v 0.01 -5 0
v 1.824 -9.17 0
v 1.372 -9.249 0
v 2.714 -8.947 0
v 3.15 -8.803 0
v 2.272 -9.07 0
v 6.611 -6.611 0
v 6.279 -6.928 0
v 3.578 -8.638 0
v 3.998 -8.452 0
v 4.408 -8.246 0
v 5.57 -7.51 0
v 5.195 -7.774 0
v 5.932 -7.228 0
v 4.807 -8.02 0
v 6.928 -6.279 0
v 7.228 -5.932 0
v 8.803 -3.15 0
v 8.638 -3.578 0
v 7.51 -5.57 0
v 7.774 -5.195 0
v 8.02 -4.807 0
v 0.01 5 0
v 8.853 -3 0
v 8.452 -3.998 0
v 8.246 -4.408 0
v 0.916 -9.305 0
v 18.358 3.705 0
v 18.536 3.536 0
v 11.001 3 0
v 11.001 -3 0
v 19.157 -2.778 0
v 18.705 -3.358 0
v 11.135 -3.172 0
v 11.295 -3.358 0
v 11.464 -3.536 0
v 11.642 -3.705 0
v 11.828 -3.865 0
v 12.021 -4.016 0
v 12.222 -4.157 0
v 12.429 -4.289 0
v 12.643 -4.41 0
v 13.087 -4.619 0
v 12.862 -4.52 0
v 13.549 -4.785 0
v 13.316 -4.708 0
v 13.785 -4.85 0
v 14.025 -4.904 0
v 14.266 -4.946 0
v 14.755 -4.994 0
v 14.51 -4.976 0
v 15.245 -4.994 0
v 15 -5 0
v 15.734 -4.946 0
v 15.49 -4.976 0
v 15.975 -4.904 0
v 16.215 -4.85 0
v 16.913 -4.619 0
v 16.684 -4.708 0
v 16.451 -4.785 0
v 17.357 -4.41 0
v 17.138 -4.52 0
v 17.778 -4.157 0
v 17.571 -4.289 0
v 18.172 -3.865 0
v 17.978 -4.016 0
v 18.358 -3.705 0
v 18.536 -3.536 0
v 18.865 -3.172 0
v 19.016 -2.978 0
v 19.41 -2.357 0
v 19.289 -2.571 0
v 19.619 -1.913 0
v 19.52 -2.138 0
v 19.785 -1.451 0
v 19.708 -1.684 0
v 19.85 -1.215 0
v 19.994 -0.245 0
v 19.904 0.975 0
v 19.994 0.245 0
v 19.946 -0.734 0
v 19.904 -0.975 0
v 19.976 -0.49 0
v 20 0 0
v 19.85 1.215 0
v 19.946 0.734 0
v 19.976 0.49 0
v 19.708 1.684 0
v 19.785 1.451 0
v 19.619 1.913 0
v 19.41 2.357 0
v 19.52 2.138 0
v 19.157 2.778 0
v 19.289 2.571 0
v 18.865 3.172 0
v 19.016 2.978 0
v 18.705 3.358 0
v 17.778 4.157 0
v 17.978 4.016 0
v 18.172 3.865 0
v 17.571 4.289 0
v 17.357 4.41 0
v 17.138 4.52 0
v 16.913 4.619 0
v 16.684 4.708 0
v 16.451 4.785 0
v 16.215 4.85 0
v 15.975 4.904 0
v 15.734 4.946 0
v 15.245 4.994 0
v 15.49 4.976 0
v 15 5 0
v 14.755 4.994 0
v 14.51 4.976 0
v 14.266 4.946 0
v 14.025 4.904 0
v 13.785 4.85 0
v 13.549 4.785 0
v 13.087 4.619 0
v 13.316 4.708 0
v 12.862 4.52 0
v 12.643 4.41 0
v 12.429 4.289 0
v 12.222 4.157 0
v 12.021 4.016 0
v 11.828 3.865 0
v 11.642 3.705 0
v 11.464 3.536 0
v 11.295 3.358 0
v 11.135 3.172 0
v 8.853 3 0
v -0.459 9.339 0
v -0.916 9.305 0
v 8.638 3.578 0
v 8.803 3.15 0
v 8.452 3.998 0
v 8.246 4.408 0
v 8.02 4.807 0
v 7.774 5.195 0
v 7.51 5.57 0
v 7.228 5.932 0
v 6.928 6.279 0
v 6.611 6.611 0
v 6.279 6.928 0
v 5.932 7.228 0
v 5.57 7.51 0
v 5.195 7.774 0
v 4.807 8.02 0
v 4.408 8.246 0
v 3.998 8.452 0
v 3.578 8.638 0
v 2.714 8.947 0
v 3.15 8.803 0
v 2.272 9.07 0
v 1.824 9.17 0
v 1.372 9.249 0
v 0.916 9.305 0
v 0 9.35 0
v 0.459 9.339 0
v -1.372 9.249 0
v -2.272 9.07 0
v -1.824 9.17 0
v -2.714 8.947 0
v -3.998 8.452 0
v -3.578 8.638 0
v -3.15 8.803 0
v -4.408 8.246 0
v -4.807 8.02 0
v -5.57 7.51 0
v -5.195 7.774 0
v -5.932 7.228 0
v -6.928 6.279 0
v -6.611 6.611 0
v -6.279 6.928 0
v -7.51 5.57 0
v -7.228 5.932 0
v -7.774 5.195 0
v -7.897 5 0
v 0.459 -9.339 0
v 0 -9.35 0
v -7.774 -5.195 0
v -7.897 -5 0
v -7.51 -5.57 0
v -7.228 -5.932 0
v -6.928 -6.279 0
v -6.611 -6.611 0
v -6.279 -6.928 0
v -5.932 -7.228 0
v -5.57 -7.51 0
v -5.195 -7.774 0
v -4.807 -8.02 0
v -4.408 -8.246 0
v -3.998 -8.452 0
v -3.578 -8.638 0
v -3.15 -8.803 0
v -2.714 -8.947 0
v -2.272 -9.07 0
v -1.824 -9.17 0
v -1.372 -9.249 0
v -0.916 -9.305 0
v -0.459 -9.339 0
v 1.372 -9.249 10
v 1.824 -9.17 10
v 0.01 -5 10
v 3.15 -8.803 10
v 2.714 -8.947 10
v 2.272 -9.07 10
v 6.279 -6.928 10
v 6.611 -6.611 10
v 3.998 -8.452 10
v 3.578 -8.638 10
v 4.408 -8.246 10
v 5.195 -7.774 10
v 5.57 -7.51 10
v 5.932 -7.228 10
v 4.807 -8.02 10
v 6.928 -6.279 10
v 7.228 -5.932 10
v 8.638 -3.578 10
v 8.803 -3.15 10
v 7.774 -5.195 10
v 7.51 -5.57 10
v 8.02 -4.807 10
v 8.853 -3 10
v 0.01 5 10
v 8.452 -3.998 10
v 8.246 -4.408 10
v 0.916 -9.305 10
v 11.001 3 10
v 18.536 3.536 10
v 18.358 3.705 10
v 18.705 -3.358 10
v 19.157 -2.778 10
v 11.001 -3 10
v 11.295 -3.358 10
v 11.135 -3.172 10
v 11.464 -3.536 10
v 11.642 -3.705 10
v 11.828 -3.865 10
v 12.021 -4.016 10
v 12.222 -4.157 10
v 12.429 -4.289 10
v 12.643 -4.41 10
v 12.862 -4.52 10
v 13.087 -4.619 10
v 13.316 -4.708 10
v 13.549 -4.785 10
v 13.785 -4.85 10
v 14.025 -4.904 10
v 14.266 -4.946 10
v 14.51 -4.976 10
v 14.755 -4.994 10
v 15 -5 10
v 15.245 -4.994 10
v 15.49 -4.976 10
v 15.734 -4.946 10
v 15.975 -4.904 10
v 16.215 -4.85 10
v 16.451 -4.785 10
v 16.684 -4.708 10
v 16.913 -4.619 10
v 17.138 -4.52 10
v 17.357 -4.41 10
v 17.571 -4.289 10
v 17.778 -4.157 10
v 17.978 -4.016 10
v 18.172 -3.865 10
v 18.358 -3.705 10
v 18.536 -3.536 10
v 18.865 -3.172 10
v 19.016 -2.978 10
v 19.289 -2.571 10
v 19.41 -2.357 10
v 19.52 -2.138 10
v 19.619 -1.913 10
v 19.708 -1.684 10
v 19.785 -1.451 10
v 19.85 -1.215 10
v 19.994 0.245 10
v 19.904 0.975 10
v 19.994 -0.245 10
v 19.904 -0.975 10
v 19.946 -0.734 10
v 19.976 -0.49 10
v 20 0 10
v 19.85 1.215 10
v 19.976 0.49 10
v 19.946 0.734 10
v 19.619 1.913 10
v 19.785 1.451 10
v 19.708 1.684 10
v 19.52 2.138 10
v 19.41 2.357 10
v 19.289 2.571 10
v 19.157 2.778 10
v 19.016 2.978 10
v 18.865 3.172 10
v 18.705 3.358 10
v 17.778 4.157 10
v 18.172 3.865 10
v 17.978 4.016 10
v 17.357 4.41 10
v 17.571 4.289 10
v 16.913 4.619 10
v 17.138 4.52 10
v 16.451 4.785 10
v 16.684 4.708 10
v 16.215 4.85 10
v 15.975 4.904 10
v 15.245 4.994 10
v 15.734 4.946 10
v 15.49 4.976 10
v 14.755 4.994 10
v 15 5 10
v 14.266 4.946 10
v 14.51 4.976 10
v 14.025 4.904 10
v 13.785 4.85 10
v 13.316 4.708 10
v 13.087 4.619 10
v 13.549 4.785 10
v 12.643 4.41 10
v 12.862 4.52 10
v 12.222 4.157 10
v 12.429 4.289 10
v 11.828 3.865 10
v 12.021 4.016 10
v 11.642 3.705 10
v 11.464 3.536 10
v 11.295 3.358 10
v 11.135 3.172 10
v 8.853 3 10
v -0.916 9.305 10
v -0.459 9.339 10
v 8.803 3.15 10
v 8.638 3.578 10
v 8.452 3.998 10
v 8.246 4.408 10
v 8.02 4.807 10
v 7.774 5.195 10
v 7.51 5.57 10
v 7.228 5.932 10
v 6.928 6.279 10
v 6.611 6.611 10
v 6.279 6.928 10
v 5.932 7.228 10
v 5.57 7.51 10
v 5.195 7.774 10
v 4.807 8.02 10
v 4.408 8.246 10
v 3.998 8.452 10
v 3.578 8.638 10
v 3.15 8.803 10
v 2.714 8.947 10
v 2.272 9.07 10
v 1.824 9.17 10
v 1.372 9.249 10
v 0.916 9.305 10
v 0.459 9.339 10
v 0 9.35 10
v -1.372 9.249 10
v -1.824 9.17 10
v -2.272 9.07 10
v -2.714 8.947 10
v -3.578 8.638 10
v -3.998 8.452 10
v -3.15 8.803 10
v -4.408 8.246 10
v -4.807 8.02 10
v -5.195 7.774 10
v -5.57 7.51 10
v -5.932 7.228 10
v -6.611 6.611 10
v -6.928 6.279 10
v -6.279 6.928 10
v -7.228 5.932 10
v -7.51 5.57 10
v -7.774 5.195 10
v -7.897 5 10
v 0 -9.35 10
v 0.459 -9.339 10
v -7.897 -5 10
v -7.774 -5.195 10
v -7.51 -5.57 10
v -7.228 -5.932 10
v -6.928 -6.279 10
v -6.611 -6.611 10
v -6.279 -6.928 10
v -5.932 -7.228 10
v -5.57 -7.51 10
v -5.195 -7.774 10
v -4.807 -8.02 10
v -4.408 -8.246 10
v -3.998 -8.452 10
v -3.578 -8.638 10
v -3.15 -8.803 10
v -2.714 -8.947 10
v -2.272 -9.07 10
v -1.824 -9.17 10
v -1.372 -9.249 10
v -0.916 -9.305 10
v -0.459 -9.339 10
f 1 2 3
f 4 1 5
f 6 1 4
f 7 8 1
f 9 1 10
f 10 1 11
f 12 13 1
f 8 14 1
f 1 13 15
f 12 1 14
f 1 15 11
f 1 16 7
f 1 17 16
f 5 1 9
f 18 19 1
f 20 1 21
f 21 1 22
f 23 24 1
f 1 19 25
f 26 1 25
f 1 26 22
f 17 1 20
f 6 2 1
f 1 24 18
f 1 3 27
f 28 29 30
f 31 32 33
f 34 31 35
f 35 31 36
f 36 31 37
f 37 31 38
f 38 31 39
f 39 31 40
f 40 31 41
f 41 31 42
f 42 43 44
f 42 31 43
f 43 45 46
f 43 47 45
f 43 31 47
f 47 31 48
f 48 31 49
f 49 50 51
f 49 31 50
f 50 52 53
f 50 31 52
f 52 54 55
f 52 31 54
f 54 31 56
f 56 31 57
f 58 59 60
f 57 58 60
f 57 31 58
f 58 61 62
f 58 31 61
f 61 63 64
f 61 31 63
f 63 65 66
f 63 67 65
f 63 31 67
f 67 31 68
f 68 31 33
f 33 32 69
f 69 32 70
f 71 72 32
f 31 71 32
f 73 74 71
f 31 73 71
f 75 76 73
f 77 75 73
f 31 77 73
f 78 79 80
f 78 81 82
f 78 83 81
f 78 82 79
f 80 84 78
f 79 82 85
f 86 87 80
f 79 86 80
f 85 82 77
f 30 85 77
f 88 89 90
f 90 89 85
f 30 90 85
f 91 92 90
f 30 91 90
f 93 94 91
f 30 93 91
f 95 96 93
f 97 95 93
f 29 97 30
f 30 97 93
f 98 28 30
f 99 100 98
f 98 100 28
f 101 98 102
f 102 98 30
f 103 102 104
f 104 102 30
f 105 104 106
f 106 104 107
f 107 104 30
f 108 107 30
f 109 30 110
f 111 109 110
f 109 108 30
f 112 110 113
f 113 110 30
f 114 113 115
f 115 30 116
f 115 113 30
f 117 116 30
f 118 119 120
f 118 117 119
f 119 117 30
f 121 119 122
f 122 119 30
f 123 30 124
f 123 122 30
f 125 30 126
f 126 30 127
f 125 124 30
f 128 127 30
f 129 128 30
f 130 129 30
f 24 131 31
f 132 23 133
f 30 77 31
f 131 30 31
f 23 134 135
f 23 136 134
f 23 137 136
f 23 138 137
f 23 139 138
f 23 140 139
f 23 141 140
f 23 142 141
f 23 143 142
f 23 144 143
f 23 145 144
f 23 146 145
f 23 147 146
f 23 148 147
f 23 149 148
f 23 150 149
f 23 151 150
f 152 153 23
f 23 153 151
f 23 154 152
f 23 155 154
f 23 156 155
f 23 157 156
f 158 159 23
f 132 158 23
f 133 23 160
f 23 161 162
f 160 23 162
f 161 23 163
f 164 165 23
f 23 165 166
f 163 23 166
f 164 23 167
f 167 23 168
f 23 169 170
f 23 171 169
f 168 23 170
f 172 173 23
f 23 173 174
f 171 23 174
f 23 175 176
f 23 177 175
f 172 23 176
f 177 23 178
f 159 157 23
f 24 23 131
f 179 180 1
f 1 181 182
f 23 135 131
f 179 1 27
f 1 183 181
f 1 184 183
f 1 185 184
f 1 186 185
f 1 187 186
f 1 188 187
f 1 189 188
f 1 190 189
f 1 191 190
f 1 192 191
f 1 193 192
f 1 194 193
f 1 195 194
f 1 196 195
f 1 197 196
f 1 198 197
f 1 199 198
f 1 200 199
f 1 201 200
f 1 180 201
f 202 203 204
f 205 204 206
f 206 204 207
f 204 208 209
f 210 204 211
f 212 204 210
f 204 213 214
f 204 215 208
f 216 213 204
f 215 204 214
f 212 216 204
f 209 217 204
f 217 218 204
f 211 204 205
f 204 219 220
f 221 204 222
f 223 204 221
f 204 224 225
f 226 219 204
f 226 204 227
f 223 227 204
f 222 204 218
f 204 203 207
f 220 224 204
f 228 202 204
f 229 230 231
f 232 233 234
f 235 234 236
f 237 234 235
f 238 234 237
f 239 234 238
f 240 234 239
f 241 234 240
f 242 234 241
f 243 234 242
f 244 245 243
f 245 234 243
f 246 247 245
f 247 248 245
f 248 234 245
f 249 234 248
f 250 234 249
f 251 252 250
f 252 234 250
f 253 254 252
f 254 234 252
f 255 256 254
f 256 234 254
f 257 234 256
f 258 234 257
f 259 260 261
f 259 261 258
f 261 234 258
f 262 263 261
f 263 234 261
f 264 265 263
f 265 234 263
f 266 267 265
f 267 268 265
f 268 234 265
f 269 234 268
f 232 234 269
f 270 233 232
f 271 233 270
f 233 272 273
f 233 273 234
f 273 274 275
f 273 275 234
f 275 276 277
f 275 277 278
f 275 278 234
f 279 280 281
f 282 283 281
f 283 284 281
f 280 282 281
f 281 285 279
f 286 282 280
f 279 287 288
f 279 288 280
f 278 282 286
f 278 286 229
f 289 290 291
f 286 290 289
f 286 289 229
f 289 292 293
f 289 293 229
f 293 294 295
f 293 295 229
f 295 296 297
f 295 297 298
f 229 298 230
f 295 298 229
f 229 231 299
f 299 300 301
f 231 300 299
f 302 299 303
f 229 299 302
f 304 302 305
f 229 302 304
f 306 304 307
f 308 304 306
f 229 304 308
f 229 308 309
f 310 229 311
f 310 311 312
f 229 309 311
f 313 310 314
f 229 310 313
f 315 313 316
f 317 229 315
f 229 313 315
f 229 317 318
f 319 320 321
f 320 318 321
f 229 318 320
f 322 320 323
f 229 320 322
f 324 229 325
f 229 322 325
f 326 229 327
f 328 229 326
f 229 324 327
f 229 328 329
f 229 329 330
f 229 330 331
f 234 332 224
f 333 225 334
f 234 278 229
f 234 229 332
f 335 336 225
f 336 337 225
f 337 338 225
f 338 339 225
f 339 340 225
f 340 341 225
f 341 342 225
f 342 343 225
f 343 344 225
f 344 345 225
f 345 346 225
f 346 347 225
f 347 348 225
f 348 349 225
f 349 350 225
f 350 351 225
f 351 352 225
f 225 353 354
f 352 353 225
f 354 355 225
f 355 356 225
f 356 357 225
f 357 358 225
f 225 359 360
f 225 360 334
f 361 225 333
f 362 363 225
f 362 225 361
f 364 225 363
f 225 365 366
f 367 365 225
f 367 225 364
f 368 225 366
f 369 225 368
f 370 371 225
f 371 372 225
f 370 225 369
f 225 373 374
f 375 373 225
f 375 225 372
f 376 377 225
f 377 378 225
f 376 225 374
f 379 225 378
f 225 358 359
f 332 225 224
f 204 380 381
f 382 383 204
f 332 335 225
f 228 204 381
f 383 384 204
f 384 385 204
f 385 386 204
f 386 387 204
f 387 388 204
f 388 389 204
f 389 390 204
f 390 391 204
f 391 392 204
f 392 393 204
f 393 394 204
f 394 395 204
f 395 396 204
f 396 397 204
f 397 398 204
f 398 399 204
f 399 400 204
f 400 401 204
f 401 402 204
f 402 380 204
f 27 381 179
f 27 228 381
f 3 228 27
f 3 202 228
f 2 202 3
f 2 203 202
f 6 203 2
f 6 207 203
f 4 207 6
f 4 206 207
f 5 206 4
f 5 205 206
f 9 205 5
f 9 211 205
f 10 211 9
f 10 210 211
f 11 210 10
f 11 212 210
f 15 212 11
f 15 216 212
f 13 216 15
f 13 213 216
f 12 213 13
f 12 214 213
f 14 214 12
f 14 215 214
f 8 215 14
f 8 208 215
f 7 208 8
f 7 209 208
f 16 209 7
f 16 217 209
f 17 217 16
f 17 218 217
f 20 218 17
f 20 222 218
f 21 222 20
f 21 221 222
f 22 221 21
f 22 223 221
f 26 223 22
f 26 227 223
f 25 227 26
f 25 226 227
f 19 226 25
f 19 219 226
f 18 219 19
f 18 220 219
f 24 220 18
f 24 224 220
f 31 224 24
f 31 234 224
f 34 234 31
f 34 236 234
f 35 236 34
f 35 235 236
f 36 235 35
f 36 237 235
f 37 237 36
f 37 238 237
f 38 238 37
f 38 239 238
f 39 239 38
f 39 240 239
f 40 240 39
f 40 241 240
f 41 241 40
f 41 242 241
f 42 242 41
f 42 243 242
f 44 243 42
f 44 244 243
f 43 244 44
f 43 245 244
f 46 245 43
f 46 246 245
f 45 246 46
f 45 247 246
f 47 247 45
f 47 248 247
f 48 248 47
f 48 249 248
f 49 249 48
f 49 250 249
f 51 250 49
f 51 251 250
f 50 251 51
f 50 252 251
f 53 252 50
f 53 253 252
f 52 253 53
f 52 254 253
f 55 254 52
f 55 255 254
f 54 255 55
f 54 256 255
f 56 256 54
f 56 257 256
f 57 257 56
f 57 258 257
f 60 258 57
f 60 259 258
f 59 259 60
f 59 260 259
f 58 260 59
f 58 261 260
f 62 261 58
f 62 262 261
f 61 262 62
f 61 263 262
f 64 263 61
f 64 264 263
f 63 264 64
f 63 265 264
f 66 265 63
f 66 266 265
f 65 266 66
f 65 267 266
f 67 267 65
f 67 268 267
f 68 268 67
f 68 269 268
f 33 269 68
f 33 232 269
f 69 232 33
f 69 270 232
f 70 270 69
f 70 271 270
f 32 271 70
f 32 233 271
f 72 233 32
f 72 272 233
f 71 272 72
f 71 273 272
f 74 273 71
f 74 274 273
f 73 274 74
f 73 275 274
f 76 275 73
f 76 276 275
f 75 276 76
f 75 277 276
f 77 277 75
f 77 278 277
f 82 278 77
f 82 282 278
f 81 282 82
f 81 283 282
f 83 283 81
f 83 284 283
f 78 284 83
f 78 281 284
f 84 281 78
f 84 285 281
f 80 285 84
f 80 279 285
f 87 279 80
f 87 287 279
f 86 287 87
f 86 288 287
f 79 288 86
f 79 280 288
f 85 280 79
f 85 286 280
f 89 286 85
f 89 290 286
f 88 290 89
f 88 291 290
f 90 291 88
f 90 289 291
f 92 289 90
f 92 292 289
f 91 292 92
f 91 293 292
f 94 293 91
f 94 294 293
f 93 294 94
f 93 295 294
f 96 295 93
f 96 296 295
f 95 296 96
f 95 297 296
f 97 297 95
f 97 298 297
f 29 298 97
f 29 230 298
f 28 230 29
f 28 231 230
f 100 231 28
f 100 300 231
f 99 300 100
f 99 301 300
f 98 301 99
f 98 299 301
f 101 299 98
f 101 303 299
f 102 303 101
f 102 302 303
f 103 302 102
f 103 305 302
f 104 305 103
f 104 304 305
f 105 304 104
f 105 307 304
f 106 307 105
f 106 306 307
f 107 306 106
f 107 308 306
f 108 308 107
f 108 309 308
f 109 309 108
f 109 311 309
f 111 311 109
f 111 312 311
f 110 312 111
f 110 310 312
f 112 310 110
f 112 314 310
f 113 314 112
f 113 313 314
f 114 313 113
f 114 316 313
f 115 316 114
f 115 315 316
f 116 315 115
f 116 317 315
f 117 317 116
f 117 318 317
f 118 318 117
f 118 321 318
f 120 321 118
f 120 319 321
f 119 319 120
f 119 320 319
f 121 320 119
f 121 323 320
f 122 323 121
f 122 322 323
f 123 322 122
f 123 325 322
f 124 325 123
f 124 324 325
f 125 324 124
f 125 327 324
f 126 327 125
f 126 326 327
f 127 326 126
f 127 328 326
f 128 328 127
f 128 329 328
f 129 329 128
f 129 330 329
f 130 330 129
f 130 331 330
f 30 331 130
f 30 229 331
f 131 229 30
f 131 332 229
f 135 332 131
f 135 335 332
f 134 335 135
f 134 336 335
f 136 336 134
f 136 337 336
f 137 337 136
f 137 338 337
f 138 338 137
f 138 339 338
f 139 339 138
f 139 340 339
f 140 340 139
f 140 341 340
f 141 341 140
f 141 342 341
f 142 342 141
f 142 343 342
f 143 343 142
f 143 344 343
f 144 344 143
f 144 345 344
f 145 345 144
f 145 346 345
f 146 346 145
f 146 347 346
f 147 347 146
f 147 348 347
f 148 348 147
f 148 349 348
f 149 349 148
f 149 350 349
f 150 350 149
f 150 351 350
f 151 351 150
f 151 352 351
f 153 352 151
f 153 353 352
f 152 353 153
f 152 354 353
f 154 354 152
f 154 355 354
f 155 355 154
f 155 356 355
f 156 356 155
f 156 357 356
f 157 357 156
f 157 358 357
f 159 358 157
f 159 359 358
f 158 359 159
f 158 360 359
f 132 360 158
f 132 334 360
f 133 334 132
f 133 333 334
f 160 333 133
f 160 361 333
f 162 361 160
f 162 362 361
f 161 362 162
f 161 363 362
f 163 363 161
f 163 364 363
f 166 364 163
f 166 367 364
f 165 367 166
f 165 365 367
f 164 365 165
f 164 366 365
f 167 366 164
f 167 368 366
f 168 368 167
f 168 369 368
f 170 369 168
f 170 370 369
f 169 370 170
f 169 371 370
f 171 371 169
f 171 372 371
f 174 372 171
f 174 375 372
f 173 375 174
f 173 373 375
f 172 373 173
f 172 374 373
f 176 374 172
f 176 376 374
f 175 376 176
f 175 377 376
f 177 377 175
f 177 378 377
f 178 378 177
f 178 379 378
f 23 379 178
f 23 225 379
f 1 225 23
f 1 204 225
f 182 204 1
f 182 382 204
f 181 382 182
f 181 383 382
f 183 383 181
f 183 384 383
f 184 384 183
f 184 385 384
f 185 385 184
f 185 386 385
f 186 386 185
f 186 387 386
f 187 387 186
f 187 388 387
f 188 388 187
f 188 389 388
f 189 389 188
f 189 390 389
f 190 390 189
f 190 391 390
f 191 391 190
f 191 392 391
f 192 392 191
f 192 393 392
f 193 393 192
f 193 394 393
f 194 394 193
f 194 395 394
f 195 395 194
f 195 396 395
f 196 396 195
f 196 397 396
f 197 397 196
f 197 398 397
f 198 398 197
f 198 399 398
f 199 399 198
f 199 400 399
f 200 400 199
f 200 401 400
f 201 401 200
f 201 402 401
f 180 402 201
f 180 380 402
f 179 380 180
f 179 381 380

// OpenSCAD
// Snap-on clip: holds a piece of tubing next to a 12.7 mm lab stand rod
// Printed flat: 2-D profile in XY, extruded 10 mm in +Z

$fn = 128;

// ---- Dimensions (mm) ----
rod_d      = 12.7;              // rod ring inner diameter
rod_wall   = 3;                 // rod ring wall thickness
rod_od     = rod_d + 2*rod_wall; // rod ring outer diameter (18.7)
bridge_w   = 6;                 // bridge width in X (x = 8 to 12)
bridge_y   = 6;                 // bridge width in Y
tub_d      = 6;                 // tubing ring inner diameter
tub_wall   = 2;                 // tubing ring wall thickness
tub_od     = tub_d + 2*tub_wall;   // tubing ring outer diameter (10)
tub_x      = 15;                // tubing ring centre X
clip_h     = 10;                // extrusion height (Z)

// ---- Cutting openings ----
rod_cut_w  = 10;                // opening width in Y (-5 < y < 5)
tub_cut_w  = 4.5;               // opening width in Y (-2.25 < y < 2.25)
eps        = 0.5;               // overshoot for clean cuts

// ---- 2-D profile ----
module clip_profile() {
    difference() {
        union() {
            // Rod ring
            circle(d = rod_od);
            // Tubing ring
            translate([tub_x, 0]) circle(d = tub_od);
            // Solid bridge between the rings
            translate([8, -bridge_y/2]) square([bridge_w, bridge_y]);
        }
        // Opening in the rod ring (on the -X side)
        translate([-(rod_od/2 + eps), -rod_cut_w/2])
            square([rod_od/2 + eps + 0.01, rod_cut_w]);
        // Opening in the tubing ring (on the +X side)
        translate([tub_x + tub_od/2 + eps, -tub_cut_w/2])
            square([tub_od/2 + eps + 0.01, tub_cut_w]);
    }
}

// ---- Part ----
linear_extrude(height = clip_h)
    clip_profile();
